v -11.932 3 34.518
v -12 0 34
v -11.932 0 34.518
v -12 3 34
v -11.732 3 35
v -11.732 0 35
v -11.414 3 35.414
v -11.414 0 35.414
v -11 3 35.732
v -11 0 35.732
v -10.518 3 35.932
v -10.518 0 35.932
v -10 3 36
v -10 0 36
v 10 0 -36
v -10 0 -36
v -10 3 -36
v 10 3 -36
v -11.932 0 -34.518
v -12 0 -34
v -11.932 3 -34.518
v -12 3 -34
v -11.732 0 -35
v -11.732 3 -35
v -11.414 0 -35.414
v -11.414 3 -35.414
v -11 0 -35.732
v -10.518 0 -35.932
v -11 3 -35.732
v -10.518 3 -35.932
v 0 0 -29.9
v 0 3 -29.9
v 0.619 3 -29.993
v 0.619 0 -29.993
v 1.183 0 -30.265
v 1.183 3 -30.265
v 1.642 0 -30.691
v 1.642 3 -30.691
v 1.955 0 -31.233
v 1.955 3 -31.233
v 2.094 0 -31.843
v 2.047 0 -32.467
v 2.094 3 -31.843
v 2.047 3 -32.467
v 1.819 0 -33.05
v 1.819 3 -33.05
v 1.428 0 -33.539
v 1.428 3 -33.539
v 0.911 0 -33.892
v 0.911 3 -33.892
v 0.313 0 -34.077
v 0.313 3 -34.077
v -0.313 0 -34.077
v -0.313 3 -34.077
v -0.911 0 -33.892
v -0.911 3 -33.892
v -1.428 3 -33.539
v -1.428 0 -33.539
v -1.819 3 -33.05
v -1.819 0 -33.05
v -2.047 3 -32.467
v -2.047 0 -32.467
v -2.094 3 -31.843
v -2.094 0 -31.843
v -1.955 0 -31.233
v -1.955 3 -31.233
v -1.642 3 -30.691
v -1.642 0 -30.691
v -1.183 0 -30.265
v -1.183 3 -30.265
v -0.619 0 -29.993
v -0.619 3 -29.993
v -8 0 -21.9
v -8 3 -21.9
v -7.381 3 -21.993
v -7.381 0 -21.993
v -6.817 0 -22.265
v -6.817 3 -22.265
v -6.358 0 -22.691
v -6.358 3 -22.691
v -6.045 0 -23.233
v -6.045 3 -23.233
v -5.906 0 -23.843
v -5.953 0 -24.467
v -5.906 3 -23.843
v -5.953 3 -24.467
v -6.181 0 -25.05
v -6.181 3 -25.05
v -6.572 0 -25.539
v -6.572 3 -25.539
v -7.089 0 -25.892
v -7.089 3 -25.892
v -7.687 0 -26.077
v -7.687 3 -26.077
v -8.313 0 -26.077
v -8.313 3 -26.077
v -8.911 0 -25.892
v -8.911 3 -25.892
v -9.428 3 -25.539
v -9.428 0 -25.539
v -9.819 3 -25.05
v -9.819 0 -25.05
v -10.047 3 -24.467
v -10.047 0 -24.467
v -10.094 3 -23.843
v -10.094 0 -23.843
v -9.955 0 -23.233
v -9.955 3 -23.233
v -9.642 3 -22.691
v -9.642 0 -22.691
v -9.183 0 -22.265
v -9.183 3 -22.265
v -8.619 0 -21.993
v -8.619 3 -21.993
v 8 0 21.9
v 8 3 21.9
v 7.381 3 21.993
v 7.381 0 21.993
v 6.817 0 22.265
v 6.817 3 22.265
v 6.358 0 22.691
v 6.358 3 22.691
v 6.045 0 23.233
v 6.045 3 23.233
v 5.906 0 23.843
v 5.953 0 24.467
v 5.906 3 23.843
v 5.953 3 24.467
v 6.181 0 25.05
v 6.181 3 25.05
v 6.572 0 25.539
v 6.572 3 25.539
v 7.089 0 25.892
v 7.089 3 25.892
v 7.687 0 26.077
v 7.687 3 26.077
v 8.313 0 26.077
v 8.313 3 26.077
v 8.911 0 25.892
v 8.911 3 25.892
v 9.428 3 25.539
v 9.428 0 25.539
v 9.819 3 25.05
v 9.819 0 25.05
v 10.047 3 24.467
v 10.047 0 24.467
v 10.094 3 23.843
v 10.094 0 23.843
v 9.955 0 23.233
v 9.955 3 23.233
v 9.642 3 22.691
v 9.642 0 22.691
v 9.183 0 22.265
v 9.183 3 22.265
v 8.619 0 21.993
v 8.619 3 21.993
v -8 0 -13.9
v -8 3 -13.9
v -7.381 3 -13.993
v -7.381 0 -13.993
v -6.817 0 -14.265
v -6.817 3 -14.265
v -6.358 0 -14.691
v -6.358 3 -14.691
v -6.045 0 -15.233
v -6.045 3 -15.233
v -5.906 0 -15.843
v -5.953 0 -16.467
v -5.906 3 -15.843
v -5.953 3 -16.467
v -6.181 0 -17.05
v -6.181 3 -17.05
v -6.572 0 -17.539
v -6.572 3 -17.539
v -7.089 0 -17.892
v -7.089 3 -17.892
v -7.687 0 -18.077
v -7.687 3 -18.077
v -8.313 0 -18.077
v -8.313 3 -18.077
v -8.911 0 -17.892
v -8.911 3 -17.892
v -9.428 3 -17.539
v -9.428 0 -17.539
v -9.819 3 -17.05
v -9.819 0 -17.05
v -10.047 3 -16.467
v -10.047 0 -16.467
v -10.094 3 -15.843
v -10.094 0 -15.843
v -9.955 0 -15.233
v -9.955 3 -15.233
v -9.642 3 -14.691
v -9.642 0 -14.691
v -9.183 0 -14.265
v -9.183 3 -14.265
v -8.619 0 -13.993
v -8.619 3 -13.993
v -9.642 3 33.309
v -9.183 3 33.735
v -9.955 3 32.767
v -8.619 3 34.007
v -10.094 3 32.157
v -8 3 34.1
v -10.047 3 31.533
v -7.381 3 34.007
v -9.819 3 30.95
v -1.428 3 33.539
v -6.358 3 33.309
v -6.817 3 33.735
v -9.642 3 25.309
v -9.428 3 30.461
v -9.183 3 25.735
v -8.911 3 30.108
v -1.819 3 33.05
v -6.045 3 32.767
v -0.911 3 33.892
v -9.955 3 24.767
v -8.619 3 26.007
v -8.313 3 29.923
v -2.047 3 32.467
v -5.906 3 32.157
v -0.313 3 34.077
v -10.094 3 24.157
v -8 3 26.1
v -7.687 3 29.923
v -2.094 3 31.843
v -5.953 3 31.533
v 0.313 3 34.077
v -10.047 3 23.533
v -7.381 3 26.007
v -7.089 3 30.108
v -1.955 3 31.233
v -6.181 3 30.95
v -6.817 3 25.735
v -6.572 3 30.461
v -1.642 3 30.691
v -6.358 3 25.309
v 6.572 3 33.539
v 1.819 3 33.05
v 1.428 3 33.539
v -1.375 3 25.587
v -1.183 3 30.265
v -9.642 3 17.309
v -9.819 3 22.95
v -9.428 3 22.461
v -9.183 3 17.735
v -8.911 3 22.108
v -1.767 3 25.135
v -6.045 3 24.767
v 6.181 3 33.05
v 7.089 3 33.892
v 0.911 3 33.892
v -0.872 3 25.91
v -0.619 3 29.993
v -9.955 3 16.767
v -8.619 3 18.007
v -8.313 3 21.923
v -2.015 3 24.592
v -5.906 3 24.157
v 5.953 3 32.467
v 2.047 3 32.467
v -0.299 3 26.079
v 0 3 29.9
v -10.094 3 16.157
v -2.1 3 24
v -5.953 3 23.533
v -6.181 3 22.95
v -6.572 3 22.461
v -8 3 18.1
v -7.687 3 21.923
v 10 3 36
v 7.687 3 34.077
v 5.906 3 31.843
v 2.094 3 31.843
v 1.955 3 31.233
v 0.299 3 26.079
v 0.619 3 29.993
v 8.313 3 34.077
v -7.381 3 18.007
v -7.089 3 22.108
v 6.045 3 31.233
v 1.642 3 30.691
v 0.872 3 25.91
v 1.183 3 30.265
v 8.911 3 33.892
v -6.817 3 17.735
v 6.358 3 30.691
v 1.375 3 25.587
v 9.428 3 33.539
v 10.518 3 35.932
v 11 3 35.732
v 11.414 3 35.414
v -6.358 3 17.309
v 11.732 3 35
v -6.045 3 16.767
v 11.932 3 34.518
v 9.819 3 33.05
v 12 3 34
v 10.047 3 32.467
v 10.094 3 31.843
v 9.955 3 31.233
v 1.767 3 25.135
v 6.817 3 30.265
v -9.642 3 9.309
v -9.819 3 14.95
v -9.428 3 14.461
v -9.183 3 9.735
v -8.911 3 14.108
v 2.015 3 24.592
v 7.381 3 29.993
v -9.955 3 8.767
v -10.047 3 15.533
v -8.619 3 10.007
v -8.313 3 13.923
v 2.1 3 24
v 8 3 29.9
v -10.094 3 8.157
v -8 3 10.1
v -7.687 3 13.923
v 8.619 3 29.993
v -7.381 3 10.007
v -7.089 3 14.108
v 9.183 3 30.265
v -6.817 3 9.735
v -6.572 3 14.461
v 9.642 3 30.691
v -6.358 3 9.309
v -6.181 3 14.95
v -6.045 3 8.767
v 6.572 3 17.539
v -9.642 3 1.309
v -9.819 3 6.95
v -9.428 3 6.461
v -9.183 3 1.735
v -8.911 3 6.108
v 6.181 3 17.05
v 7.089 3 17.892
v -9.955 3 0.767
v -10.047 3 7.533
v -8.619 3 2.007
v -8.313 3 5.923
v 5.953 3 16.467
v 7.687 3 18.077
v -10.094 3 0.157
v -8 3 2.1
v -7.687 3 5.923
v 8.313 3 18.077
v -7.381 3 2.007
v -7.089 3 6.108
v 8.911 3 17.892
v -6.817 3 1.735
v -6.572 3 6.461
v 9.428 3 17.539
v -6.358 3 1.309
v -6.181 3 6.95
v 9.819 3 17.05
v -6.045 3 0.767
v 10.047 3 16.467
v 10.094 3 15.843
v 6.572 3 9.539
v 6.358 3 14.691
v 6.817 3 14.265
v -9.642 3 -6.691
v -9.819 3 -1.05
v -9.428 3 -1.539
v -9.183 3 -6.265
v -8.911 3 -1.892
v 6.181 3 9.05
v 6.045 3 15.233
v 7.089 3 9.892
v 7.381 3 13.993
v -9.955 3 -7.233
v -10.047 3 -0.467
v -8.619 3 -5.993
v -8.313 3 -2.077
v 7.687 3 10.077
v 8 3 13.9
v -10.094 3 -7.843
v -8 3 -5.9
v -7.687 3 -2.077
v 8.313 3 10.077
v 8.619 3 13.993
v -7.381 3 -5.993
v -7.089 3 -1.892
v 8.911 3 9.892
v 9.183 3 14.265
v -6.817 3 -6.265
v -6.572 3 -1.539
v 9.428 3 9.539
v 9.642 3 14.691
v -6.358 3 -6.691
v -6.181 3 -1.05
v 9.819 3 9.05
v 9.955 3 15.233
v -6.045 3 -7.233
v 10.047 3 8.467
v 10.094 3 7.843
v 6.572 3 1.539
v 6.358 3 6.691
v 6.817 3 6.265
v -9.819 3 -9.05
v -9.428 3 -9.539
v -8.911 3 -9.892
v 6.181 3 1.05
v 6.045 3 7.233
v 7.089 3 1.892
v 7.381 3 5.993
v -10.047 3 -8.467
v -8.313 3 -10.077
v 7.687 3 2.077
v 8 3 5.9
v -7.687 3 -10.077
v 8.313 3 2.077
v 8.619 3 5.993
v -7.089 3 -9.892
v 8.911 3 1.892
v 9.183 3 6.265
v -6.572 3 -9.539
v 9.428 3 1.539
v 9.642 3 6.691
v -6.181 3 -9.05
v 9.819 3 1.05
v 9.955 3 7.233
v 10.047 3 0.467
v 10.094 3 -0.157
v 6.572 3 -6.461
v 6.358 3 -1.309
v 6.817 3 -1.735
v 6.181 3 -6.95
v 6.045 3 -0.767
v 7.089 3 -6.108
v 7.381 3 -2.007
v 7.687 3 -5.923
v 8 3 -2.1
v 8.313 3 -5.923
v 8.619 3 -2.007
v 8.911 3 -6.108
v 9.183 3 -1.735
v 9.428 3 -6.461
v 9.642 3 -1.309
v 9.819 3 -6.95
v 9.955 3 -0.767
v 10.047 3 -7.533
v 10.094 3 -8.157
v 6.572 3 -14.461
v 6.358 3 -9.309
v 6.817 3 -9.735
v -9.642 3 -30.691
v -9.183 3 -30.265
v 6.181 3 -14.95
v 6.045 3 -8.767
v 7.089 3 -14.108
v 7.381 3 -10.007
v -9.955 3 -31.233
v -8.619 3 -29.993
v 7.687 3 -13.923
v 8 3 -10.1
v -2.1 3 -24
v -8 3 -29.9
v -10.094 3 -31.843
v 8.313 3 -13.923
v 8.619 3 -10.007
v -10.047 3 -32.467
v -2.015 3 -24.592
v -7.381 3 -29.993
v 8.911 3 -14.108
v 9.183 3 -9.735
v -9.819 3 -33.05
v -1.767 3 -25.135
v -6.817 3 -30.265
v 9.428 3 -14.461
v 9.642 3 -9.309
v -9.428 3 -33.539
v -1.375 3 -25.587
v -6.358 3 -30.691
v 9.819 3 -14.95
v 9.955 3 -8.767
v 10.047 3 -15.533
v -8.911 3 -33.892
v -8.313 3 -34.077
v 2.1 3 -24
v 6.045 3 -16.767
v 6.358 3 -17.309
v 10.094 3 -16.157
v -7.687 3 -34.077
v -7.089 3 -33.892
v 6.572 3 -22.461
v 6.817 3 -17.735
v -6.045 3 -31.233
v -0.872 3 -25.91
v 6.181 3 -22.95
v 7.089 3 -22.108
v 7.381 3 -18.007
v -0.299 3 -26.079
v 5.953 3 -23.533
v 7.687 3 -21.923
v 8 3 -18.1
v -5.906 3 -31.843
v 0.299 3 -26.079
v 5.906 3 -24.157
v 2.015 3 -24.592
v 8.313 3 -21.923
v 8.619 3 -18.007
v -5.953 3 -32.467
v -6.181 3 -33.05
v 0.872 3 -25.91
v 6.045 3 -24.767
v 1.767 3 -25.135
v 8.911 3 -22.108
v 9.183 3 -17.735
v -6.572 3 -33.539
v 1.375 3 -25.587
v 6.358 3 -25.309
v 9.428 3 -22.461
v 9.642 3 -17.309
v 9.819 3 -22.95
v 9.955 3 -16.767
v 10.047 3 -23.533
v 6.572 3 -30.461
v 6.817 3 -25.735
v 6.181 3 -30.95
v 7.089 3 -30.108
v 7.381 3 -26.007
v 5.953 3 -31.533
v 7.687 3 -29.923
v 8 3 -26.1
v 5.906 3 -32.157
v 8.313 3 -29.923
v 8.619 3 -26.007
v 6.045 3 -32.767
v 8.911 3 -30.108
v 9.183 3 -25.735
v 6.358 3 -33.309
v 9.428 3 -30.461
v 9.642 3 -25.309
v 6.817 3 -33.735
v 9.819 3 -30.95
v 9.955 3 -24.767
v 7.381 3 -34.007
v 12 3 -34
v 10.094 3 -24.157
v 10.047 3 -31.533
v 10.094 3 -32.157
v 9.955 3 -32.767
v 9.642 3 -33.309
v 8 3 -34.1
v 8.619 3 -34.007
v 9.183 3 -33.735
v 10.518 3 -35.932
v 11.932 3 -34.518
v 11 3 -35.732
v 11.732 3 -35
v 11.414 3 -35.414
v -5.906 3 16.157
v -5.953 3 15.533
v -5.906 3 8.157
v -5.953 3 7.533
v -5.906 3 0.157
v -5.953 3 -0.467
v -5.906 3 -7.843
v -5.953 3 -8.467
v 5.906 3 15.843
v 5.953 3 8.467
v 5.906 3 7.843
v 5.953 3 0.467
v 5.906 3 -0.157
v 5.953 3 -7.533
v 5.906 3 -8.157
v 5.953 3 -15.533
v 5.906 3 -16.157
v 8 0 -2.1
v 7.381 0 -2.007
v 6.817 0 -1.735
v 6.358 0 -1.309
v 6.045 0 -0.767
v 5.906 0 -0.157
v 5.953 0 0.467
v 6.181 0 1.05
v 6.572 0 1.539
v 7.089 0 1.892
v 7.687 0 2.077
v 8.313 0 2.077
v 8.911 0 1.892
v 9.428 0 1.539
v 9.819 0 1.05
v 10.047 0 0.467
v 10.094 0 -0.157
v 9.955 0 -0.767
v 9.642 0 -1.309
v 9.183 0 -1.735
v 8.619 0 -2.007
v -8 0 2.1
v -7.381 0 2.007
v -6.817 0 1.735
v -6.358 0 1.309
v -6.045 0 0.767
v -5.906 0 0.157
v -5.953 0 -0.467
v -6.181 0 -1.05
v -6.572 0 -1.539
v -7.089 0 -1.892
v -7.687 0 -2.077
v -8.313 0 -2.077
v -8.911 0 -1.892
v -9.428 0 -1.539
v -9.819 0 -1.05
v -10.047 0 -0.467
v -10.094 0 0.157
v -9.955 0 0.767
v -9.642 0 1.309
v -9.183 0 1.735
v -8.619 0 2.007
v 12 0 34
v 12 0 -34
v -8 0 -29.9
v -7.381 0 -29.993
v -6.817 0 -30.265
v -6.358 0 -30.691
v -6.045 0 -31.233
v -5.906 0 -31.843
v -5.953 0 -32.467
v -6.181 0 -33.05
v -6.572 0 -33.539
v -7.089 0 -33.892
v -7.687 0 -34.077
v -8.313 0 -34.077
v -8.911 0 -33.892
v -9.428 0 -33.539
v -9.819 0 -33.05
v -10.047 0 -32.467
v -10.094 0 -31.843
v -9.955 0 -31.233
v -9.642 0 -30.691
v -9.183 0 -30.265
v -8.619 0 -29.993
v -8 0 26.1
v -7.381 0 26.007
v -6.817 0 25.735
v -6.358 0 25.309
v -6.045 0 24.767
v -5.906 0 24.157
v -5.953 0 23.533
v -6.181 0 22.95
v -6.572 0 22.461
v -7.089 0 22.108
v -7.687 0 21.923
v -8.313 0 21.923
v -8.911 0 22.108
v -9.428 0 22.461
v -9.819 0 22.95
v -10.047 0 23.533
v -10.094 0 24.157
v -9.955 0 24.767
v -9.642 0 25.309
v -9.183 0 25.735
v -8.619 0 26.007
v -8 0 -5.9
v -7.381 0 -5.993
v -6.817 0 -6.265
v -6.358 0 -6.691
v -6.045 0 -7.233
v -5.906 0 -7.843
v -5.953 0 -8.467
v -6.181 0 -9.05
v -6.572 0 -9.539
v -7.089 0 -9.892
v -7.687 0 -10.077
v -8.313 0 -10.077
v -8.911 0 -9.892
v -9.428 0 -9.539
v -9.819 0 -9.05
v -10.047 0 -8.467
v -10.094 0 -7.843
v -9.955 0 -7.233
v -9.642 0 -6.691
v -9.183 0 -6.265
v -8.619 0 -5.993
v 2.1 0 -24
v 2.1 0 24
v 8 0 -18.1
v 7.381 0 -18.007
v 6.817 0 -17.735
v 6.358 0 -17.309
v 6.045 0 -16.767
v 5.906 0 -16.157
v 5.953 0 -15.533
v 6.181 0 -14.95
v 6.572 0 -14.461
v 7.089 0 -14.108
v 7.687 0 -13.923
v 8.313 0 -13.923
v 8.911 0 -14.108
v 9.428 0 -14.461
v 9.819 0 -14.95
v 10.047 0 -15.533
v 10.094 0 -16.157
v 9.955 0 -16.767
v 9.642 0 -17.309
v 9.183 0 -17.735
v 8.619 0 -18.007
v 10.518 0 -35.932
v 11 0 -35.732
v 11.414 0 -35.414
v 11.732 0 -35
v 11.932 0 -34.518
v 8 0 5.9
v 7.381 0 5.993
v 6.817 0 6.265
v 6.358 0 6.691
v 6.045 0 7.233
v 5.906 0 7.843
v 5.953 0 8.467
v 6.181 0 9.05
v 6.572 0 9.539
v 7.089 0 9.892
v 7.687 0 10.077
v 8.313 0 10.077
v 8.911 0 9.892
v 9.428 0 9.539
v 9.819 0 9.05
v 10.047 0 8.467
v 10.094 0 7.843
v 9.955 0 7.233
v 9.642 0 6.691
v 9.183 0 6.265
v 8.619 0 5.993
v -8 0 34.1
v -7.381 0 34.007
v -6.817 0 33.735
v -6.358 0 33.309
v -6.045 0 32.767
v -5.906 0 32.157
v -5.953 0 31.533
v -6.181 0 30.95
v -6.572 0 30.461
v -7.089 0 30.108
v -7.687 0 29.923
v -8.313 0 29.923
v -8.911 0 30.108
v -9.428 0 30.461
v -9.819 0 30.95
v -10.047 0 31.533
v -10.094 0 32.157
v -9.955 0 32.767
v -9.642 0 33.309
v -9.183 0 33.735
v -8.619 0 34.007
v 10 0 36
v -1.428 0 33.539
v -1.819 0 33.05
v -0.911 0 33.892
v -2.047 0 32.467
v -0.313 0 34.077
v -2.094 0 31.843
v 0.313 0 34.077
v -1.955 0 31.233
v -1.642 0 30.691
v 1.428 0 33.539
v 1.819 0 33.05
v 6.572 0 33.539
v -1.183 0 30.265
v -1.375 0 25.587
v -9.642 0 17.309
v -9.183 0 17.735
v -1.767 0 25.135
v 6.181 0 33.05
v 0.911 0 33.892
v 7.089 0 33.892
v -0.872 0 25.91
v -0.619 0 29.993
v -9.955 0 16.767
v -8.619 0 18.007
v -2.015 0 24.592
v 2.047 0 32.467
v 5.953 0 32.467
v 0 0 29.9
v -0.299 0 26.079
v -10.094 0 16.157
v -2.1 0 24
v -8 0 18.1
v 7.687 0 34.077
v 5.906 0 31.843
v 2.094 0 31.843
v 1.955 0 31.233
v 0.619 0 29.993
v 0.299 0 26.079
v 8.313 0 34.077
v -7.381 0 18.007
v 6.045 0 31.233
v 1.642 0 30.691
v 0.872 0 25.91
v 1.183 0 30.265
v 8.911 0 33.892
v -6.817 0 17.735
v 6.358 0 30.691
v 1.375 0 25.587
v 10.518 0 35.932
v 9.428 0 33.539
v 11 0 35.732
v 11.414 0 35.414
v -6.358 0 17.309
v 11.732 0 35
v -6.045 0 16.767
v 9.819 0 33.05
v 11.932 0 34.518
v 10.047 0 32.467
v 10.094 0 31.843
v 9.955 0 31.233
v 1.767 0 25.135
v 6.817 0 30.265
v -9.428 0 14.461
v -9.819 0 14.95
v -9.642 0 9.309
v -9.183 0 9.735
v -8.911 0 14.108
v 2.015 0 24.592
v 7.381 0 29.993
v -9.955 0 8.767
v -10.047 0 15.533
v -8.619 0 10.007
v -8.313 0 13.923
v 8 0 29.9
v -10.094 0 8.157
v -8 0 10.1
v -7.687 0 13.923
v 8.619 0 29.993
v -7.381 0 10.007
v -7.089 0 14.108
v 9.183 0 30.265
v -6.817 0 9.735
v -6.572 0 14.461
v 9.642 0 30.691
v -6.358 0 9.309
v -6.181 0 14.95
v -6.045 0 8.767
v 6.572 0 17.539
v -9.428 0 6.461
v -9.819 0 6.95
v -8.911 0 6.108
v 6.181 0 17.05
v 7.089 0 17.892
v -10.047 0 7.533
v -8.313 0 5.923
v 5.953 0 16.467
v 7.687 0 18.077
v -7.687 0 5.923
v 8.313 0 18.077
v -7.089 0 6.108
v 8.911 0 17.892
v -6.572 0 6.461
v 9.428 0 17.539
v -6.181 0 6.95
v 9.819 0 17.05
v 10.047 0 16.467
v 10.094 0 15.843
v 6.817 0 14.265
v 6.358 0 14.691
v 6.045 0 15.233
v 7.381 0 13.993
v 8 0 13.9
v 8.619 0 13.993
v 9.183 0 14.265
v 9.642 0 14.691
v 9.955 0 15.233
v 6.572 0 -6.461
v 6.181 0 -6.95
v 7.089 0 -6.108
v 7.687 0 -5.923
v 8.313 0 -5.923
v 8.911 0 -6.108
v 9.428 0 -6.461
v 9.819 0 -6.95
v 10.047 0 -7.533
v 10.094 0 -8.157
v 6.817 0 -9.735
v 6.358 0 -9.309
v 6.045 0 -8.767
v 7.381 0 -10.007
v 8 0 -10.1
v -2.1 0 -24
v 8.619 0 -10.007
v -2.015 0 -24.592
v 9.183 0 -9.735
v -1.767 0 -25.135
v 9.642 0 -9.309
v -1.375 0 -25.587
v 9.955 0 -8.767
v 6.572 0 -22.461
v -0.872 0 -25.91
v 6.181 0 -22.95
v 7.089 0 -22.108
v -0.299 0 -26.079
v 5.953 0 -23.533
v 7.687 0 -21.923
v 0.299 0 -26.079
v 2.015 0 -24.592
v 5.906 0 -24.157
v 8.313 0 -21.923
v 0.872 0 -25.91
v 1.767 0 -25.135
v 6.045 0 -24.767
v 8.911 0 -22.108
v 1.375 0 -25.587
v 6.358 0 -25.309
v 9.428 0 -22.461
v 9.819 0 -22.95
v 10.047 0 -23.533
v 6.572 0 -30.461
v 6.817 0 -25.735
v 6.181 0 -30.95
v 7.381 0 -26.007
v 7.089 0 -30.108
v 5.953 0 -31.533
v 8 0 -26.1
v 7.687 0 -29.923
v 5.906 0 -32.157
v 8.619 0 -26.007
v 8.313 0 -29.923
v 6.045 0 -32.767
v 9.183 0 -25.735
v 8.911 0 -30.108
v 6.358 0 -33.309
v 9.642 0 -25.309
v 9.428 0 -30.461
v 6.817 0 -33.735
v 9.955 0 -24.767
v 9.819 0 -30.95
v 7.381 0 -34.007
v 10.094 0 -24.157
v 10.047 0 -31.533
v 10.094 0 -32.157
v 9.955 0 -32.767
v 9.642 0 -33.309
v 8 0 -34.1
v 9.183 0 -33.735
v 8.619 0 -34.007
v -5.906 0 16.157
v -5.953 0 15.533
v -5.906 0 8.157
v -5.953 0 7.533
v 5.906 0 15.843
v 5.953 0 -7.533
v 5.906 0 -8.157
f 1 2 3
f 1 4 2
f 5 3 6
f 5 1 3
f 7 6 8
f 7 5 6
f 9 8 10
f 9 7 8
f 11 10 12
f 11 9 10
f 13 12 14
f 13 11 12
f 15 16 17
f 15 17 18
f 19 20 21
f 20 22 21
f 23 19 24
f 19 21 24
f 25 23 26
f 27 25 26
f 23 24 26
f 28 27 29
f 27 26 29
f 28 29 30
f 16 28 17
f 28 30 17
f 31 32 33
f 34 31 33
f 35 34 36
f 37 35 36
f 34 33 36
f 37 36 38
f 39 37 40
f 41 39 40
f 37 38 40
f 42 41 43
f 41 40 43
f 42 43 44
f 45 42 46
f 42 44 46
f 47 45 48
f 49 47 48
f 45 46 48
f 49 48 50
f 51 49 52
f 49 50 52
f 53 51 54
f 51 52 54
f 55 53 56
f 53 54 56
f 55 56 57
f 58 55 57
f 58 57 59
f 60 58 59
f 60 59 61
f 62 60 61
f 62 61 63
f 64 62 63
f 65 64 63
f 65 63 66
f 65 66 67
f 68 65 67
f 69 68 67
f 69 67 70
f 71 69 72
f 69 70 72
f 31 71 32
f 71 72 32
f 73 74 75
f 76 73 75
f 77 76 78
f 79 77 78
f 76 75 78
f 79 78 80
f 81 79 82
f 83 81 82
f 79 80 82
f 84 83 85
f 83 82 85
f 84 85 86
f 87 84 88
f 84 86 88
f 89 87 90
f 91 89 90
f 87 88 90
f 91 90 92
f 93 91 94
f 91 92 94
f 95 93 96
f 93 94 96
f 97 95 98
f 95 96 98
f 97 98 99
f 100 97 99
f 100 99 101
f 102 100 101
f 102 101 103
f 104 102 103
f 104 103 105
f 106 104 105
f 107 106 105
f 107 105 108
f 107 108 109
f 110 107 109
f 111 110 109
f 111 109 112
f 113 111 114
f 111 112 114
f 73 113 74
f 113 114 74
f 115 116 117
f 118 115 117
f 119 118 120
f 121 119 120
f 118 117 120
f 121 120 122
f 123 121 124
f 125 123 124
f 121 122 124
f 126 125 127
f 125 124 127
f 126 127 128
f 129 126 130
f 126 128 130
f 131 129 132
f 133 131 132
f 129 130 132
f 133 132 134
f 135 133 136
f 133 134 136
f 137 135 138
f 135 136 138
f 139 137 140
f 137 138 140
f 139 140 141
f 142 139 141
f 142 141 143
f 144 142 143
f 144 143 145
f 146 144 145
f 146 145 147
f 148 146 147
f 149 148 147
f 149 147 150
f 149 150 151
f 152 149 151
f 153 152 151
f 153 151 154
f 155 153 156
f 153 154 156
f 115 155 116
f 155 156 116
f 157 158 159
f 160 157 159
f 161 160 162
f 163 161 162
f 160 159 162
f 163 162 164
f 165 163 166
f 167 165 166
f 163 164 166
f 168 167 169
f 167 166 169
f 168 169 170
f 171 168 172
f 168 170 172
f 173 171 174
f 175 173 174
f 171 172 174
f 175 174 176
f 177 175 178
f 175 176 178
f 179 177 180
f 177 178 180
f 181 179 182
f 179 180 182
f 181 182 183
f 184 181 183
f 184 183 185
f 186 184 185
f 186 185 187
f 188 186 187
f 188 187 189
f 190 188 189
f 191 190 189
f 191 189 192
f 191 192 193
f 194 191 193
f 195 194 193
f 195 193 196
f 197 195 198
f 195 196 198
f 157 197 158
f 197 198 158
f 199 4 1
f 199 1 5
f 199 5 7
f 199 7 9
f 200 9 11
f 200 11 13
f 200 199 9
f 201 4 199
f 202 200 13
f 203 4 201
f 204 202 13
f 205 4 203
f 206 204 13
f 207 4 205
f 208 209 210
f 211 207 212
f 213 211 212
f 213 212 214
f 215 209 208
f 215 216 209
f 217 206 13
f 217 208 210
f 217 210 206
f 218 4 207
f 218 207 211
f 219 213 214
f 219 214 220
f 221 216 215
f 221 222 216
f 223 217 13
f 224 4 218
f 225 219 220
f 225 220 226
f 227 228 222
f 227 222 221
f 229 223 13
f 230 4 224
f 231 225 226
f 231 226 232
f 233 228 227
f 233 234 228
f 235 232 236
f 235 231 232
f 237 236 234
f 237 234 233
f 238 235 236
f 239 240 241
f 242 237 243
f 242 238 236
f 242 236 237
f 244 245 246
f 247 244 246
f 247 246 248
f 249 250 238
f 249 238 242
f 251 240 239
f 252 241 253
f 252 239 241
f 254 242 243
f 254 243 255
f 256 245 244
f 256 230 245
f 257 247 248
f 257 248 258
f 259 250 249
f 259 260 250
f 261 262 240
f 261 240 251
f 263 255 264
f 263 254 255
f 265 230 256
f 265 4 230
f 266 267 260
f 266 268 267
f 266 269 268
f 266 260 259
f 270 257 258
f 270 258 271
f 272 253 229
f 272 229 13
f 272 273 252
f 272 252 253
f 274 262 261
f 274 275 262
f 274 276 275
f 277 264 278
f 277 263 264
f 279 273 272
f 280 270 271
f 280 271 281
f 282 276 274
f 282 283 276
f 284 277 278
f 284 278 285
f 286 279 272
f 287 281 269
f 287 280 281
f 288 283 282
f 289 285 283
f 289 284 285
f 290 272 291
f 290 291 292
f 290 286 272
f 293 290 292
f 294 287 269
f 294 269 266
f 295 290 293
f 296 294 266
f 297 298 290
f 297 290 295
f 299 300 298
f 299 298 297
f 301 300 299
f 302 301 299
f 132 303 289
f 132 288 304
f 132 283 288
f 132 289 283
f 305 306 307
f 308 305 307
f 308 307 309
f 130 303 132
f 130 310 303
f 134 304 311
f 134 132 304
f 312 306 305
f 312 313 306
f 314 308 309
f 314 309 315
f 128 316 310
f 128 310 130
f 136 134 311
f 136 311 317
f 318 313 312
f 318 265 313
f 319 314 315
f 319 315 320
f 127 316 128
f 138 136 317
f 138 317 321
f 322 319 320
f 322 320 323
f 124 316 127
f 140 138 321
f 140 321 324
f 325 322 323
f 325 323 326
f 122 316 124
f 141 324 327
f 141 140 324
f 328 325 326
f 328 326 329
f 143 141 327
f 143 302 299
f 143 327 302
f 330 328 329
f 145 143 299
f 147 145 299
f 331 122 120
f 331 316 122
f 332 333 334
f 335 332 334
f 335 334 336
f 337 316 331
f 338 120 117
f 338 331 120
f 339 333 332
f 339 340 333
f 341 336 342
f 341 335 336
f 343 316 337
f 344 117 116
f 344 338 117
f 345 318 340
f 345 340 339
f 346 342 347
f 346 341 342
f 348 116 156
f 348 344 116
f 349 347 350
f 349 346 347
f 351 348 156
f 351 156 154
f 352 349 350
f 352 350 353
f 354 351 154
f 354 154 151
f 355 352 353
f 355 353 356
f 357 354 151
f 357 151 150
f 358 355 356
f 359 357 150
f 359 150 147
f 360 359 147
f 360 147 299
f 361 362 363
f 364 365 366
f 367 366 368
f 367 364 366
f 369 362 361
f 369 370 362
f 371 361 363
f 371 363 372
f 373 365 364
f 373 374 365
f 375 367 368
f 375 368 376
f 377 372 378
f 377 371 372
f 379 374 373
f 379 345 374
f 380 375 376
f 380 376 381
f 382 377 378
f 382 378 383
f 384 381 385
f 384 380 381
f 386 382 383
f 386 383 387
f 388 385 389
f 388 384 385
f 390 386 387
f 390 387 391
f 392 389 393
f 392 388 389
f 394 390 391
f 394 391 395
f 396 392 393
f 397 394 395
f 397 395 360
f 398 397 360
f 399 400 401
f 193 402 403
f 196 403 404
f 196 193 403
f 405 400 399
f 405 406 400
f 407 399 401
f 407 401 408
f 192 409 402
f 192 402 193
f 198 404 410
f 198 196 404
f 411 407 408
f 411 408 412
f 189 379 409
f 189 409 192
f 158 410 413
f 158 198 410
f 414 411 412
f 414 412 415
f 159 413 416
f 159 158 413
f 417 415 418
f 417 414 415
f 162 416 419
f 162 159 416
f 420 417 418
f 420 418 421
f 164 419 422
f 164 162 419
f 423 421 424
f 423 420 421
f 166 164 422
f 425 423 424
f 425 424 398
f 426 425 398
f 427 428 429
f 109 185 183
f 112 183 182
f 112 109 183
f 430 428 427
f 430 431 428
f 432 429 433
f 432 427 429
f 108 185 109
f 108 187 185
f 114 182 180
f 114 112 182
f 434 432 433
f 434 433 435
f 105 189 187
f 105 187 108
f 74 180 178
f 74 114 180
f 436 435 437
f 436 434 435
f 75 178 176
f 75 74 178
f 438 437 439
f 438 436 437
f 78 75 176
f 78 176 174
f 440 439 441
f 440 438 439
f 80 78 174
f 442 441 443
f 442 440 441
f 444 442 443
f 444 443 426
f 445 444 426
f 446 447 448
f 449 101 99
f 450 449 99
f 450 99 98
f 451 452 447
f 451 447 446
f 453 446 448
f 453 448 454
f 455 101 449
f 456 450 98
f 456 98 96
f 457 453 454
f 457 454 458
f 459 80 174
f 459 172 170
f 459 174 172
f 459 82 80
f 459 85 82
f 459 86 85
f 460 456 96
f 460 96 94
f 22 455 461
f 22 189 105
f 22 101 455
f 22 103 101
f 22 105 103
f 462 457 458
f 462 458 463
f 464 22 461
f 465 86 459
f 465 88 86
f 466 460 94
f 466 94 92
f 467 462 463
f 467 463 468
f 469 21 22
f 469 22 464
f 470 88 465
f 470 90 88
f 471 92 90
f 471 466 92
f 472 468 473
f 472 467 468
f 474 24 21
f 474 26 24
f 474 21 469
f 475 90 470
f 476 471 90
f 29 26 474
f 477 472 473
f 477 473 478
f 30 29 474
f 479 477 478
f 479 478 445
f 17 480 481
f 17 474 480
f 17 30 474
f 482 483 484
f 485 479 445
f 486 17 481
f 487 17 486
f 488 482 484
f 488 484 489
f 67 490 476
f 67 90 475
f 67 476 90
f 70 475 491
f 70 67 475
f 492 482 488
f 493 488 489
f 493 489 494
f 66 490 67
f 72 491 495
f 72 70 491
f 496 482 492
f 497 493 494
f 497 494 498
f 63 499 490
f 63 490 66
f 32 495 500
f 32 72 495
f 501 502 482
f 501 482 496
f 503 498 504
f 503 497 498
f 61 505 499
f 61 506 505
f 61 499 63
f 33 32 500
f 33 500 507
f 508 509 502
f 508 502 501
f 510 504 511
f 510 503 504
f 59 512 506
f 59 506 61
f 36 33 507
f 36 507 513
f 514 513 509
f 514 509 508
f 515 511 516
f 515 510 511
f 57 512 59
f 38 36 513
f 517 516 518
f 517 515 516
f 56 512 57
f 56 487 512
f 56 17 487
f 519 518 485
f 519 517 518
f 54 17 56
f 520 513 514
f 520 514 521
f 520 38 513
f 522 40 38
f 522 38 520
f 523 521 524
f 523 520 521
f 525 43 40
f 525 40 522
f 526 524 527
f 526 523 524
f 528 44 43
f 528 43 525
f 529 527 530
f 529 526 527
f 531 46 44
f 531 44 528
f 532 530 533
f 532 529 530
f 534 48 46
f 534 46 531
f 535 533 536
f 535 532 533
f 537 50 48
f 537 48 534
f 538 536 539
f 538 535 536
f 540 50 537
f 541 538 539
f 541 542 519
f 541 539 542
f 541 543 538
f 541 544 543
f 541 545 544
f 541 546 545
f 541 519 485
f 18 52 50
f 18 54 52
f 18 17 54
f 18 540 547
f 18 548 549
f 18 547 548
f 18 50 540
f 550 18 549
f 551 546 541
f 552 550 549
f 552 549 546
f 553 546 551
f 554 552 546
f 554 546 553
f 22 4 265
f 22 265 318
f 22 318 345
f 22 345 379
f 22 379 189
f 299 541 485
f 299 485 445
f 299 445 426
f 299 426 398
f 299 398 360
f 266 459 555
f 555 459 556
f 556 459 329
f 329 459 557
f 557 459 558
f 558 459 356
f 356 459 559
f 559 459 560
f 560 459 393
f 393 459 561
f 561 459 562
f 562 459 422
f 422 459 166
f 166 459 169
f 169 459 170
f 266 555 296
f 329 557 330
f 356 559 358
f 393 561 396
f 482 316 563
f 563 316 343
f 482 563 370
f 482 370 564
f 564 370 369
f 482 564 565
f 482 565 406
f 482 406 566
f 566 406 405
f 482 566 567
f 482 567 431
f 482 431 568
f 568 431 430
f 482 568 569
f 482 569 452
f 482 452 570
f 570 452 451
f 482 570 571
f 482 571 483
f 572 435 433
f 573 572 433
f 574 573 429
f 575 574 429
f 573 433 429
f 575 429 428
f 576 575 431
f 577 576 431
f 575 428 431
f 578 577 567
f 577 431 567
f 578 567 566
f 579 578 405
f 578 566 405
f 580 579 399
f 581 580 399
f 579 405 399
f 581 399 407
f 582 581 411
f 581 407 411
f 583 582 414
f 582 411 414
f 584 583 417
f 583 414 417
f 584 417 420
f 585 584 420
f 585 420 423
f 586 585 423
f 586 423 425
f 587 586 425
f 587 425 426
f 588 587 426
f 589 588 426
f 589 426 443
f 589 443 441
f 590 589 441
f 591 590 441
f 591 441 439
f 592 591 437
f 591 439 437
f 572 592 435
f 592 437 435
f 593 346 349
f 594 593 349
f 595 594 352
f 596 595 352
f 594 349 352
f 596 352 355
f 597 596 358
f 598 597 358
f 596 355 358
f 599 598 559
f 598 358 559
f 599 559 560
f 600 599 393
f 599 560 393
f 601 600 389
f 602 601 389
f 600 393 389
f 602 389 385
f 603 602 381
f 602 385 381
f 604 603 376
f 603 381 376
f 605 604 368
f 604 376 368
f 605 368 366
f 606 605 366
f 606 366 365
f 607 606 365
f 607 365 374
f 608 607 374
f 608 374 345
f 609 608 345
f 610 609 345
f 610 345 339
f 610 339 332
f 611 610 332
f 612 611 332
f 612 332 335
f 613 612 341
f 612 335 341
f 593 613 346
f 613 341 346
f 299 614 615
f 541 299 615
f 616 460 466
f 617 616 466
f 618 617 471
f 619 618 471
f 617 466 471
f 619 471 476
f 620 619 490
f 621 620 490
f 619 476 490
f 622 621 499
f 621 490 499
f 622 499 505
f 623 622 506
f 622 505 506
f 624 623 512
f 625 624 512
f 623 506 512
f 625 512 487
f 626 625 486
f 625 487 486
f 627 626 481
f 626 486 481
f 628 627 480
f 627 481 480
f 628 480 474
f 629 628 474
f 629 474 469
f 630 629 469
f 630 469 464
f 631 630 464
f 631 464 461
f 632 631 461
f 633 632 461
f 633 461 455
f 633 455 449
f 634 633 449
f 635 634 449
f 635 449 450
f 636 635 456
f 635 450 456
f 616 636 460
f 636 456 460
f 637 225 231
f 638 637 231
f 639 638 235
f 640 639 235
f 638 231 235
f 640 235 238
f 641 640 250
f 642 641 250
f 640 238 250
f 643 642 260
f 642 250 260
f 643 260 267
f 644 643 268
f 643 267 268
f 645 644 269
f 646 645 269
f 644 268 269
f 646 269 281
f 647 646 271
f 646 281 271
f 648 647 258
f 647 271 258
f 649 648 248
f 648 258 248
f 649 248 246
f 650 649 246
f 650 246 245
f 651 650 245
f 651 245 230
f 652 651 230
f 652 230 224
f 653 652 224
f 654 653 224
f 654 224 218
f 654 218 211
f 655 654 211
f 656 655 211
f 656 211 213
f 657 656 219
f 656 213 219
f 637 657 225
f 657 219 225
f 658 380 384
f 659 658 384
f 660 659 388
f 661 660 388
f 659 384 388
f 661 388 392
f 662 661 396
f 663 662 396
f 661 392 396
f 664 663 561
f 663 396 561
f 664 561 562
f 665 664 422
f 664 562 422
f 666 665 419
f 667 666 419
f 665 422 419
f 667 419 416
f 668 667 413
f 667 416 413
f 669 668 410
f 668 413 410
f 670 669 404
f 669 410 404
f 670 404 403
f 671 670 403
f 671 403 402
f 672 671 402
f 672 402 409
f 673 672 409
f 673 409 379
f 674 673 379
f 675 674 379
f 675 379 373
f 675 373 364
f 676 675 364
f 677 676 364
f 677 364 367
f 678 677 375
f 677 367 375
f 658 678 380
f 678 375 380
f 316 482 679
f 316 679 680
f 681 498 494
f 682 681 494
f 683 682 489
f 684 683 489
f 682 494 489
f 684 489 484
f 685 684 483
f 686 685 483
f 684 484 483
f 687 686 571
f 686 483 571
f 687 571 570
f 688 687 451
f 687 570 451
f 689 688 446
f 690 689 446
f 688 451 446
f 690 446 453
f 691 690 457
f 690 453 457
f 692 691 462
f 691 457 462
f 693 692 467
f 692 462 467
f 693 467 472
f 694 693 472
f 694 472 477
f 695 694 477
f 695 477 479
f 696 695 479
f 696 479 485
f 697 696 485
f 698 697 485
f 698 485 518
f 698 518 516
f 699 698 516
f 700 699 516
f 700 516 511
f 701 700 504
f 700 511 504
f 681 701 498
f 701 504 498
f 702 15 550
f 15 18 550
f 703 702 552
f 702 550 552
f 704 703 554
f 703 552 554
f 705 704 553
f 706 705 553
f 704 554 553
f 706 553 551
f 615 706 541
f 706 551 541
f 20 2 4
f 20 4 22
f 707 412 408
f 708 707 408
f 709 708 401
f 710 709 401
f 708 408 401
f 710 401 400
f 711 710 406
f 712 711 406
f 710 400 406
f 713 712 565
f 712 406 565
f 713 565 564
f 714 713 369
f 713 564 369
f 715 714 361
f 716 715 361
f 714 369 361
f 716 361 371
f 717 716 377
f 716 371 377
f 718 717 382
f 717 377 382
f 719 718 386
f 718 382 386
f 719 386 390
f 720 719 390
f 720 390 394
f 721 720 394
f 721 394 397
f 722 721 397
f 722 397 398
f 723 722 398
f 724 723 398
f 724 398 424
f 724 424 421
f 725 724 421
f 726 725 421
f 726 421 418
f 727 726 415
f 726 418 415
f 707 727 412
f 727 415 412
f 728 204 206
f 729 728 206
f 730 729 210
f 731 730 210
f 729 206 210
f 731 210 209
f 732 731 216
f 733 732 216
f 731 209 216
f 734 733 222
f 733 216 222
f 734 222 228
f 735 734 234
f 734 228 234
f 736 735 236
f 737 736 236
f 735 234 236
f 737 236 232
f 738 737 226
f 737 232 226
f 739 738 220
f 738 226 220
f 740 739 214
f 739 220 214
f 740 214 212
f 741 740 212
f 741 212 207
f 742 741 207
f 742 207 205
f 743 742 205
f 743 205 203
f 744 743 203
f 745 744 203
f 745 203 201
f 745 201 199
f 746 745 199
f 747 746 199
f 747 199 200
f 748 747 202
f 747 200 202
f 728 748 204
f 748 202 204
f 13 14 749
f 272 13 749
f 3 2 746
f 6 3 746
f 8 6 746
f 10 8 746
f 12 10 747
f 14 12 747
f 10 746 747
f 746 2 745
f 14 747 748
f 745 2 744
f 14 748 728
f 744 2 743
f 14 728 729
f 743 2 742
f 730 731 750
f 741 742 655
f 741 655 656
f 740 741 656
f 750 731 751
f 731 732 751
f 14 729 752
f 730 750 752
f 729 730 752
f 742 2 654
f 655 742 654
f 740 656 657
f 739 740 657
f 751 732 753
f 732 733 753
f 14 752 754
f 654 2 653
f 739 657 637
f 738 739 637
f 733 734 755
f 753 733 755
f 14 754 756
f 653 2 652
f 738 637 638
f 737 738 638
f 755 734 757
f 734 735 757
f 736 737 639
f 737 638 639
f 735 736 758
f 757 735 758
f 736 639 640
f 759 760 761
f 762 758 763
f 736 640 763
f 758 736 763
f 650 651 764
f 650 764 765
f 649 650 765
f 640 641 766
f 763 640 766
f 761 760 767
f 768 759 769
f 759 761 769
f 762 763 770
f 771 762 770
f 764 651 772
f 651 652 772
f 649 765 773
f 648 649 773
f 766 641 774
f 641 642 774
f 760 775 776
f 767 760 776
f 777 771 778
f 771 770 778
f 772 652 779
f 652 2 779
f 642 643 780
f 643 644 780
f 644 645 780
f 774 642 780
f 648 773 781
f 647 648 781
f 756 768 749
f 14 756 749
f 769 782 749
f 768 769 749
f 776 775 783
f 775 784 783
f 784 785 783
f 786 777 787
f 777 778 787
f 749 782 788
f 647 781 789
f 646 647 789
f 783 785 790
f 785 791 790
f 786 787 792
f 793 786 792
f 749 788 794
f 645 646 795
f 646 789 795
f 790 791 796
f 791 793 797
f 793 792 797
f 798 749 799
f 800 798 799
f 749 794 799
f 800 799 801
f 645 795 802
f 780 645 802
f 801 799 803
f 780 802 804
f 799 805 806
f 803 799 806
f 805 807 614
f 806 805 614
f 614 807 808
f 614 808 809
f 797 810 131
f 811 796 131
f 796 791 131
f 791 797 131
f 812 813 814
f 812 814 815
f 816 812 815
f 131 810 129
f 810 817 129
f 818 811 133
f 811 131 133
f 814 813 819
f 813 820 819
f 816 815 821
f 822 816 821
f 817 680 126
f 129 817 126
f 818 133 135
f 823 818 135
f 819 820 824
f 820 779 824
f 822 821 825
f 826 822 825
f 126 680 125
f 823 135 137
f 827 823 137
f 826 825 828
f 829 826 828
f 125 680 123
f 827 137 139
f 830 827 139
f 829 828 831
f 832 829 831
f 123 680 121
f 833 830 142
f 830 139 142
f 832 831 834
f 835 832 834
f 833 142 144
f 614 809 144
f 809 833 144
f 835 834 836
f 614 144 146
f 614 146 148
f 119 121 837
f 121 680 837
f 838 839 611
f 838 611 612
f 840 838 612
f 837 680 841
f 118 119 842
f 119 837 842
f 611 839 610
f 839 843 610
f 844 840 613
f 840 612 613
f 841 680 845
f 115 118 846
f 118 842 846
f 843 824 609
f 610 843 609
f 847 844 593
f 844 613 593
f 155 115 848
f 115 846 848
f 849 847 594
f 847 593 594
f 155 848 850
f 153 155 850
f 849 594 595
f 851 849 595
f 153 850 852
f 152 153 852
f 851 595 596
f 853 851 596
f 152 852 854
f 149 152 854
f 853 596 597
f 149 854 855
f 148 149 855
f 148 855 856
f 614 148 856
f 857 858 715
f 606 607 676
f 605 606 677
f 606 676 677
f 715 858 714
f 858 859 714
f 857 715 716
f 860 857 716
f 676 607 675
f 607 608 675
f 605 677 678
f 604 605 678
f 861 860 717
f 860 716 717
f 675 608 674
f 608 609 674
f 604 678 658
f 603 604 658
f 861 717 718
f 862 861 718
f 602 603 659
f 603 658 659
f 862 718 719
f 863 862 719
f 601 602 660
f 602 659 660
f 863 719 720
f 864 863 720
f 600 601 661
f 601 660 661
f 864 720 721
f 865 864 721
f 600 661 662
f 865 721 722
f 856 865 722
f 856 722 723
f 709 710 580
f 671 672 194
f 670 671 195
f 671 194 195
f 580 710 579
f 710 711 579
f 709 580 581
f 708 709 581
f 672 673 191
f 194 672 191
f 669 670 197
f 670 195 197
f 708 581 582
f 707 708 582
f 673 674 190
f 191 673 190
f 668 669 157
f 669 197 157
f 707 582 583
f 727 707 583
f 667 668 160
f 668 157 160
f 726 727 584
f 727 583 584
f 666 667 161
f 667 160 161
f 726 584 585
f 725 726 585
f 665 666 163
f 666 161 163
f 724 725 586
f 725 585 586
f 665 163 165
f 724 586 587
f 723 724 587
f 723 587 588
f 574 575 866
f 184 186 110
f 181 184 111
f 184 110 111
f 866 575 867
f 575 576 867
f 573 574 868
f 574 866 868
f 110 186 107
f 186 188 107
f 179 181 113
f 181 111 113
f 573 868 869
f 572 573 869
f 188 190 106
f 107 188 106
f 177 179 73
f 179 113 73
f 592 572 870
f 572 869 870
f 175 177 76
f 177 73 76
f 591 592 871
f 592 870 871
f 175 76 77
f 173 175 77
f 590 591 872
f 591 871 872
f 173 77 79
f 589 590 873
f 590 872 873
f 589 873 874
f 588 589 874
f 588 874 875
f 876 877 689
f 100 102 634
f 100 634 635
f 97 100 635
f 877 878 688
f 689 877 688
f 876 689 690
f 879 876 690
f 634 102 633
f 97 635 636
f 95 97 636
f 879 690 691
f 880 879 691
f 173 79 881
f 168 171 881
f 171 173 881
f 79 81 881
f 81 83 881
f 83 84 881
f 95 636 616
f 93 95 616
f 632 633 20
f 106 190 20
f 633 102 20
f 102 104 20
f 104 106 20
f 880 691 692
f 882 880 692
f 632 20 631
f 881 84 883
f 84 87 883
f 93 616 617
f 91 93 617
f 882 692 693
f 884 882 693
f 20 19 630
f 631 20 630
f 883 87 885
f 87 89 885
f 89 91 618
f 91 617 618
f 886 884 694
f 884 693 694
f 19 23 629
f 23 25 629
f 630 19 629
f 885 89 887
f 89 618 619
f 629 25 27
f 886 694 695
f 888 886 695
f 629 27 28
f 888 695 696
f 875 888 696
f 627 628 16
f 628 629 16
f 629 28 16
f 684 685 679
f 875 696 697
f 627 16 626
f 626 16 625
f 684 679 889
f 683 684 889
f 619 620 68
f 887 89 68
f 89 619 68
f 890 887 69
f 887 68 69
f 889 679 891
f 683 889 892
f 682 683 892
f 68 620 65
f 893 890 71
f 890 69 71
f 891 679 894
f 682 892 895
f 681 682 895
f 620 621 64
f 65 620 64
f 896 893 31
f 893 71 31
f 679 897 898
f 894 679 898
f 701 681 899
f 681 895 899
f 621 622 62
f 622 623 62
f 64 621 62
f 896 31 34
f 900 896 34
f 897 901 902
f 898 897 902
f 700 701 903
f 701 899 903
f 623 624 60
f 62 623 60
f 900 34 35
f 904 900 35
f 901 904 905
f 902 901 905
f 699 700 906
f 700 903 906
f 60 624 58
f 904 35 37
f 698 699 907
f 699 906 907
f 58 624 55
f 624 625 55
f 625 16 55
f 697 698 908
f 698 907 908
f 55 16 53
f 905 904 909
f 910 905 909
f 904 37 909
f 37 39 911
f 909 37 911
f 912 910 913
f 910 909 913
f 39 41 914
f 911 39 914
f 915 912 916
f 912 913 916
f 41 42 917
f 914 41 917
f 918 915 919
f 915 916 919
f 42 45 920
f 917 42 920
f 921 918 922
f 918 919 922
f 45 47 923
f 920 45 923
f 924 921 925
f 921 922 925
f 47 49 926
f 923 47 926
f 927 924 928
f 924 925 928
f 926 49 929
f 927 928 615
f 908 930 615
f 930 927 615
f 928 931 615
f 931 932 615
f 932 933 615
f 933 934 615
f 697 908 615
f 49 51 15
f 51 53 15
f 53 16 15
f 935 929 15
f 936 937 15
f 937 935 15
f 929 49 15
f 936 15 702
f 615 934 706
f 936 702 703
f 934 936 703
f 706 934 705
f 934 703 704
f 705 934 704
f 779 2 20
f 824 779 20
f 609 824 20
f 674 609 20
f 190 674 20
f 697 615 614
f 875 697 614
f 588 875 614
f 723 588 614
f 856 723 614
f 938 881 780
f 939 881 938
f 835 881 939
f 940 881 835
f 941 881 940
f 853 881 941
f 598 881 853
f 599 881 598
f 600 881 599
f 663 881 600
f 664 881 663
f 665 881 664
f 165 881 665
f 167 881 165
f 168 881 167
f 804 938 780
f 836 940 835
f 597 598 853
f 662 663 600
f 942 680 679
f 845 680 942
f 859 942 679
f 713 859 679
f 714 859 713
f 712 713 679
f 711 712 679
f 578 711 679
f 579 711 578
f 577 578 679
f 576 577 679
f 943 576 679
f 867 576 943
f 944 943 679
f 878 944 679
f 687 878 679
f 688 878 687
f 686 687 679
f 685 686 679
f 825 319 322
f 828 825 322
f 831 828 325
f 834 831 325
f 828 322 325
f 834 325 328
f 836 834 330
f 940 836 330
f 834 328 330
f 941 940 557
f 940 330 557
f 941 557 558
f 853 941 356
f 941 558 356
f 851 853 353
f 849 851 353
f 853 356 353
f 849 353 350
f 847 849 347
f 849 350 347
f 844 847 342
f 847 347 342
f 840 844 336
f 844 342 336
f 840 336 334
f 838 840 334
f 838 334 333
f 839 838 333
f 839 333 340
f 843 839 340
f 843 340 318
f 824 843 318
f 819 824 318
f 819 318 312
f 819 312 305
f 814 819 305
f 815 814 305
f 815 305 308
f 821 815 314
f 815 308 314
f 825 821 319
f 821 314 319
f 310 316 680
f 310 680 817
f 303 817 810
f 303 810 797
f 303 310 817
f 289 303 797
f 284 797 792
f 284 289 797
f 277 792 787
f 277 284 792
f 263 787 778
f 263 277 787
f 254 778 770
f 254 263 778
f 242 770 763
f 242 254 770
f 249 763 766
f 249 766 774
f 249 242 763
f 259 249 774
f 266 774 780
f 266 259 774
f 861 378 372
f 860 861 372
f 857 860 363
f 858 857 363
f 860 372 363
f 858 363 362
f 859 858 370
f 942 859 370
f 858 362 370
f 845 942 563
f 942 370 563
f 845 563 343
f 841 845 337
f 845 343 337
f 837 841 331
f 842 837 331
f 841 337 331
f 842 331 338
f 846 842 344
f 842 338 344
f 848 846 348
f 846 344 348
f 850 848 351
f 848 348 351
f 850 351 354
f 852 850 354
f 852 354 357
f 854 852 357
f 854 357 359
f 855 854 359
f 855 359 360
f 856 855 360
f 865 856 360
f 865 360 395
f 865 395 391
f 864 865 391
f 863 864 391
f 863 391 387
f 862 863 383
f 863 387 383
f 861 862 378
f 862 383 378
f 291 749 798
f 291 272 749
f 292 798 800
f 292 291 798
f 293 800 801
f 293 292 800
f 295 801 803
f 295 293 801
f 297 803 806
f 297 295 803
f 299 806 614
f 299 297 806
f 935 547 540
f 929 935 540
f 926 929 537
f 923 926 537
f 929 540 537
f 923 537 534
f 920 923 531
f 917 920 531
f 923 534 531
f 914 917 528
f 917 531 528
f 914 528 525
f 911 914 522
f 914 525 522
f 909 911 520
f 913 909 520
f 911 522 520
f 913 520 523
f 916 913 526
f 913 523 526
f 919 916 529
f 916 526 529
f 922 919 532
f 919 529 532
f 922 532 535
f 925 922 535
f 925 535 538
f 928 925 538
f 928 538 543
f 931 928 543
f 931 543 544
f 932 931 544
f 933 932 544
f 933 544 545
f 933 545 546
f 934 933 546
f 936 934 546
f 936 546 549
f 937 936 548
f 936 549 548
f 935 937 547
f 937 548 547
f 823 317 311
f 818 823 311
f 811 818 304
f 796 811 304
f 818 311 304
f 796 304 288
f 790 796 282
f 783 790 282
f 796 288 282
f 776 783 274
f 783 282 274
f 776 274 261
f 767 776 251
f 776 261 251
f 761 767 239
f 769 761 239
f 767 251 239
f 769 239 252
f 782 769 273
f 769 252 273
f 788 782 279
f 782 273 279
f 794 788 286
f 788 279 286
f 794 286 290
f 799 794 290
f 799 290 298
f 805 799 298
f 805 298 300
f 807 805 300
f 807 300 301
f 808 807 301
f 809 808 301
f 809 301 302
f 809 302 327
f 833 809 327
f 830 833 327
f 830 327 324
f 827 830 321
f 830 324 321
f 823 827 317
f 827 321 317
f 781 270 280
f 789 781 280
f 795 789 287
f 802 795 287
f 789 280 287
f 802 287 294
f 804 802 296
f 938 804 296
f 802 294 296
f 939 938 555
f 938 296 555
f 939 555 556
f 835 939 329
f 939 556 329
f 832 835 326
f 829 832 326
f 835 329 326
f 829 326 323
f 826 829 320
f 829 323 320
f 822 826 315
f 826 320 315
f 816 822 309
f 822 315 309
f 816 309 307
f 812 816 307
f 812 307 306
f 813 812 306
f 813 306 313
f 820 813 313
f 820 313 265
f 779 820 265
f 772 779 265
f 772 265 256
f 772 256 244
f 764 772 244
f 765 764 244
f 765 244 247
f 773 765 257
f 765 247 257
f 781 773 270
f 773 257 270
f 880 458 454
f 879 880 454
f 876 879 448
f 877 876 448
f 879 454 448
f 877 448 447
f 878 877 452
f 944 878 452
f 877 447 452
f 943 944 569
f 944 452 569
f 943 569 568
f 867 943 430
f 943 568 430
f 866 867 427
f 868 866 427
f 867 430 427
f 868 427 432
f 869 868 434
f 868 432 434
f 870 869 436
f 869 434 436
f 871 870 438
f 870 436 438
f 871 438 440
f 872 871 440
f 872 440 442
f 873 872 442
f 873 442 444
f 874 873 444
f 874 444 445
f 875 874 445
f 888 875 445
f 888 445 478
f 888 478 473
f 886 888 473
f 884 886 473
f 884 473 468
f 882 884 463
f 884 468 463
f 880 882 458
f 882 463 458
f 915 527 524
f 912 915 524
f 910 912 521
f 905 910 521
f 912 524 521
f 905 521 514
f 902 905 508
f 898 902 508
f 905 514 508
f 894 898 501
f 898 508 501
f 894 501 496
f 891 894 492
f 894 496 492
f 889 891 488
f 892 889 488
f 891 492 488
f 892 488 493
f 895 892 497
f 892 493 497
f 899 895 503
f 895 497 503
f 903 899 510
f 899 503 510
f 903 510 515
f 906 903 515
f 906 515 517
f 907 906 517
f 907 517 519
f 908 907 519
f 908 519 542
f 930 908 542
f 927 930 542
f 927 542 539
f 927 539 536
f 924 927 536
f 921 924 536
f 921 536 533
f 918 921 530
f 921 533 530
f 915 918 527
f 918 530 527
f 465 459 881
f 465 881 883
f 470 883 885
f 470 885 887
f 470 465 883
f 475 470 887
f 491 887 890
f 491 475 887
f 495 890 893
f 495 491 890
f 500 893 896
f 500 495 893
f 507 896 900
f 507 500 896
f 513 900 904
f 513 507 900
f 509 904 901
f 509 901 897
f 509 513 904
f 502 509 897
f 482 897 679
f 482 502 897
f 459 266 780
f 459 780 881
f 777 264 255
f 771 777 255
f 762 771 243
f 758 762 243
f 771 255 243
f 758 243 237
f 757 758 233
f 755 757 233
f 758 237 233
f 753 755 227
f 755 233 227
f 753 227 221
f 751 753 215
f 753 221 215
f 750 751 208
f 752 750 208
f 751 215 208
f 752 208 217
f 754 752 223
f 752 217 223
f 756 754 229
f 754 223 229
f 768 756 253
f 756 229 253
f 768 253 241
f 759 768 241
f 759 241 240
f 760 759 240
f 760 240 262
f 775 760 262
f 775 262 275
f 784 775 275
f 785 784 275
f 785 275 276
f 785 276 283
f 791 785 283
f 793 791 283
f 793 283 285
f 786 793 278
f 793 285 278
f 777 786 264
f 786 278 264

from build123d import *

# Parameters (mm, degrees)
SKETCH_1_W          = 24
SKETCH_1_H          = 72
EXTRUDE_2_DEPTH     = 3
SKETCH_2_R          = 2.1
CUT_EXTRUDE_1_DEPTH = 3
CUT_EXTRUDE_2_DEPTH = 3
FILLET_1_R          = 2


with BuildPart() as part:
    # 草图1 → 凸台-拉伸2 (new body)
    with BuildSketch(Plane(origin=(0, 0, 0), x_dir=(1, 0, 0), z_dir=(0, 1, 0))):
        Rectangle(SKETCH_1_W, SKETCH_1_H)
    extrude(amount=EXTRUDE_2_DEPTH)

    # 草图2 → 切除-拉伸1 (cut)
    with BuildSketch(Plane(origin=(0, 3, 0), x_dir=(1, 0, 0), z_dir=(0, 1, 0))):
        with Locations(Location((-8, -32, 0), (0, 0, 270))):
            Circle(SKETCH_2_R)
        with Locations(Location((-8, -24, 0), (0, 0, 270))):
            Circle(SKETCH_2_R)
        with Locations(Location((-8, -16, 0), (0, 0, 270))):
            Circle(SKETCH_2_R)
        with Locations(Location((-8, -8, 0), (0, 0, 270))):
            Circle(SKETCH_2_R)
        with Locations(Location((-8, 0, 0), (0, 0, 270))):
            Circle(SKETCH_2_R)
        with Locations(Location((-8, 8, 0), (0, 0, 270))):
            Circle(SKETCH_2_R)
        with Locations(Location((-8, 16, 0), (0, 0, 270))):
            Circle(SKETCH_2_R)
        with Locations(Location((-8, 24, 0), (0, 0, 270))):
            Circle(SKETCH_2_R)
        with Locations(Location((-8, 32, 0), (0, 0, 270))):
            Circle(SKETCH_2_R)
        with Locations(Location((8, -24, 0), (0, 0, 90))):
            Circle(SKETCH_2_R)
        with Locations(Location((8, -16, 0), (0, 0, 90))):
            Circle(SKETCH_2_R)
        with Locations(Location((8, -8, 0), (0, 0, 90))):
            Circle(SKETCH_2_R)
        with Locations(Location((8, 0, 0), (0, 0, 90))):
            Circle(SKETCH_2_R)
        with Locations(Location((8, 8, 0), (0, 0, 90))):
            Circle(SKETCH_2_R)
        with Locations(Location((8, 16, 0), (0, 0, 90))):
            Circle(SKETCH_2_R)
        with Locations(Location((8, 24, 0), (0, 0, 90))):
            Circle(SKETCH_2_R)
        with Locations(Location((8, 32, 0), (0, 0, 90))):
            Circle(SKETCH_2_R)
        with Locations(Location((8, -32, 0), (0, 0, 90))):
            Circle(SKETCH_2_R)
        with Locations(Location((0, -32, 0), (0, 0, 90))):
            Circle(SKETCH_2_R)
        with Locations(Location((0, 32, 0), (0, 0, 270))):
            Circle(SKETCH_2_R)
    extrude(amount=-CUT_EXTRUDE_1_DEPTH, mode=Mode.SUBTRACT)

    # 草图3 → 切除-拉伸2 (cut)
    with BuildSketch(Plane(origin=(0, 3, 0), x_dir=(1, 0, 0), z_dir=(0, 1, 0))):
        with BuildLine():
            Line((-2.1, -24), (-2.1, 24))
            ThreePointArc((-2.1, 24), (0, 26.1), (2.1, 24))
            Line((2.1, 24), (2.1, -24))
            ThreePointArc((2.1, -24), (0, -26.1), (-2.1, -24))
        make_face()
    extrude(amount=-CUT_EXTRUDE_2_DEPTH, mode=Mode.SUBTRACT)

    # 圆角1
    fillet_1_edges = [part.edges().sort_by_distance(p)[0] for p in [
        (12, 1.5, 36),
        (-12, 1.5, 36),
        (-12, 1.5, -36),
        (12, 1.5, -36),
    ]]
    fillet(fillet_1_edges, radius=FILLET_1_R)


solid = part.part
